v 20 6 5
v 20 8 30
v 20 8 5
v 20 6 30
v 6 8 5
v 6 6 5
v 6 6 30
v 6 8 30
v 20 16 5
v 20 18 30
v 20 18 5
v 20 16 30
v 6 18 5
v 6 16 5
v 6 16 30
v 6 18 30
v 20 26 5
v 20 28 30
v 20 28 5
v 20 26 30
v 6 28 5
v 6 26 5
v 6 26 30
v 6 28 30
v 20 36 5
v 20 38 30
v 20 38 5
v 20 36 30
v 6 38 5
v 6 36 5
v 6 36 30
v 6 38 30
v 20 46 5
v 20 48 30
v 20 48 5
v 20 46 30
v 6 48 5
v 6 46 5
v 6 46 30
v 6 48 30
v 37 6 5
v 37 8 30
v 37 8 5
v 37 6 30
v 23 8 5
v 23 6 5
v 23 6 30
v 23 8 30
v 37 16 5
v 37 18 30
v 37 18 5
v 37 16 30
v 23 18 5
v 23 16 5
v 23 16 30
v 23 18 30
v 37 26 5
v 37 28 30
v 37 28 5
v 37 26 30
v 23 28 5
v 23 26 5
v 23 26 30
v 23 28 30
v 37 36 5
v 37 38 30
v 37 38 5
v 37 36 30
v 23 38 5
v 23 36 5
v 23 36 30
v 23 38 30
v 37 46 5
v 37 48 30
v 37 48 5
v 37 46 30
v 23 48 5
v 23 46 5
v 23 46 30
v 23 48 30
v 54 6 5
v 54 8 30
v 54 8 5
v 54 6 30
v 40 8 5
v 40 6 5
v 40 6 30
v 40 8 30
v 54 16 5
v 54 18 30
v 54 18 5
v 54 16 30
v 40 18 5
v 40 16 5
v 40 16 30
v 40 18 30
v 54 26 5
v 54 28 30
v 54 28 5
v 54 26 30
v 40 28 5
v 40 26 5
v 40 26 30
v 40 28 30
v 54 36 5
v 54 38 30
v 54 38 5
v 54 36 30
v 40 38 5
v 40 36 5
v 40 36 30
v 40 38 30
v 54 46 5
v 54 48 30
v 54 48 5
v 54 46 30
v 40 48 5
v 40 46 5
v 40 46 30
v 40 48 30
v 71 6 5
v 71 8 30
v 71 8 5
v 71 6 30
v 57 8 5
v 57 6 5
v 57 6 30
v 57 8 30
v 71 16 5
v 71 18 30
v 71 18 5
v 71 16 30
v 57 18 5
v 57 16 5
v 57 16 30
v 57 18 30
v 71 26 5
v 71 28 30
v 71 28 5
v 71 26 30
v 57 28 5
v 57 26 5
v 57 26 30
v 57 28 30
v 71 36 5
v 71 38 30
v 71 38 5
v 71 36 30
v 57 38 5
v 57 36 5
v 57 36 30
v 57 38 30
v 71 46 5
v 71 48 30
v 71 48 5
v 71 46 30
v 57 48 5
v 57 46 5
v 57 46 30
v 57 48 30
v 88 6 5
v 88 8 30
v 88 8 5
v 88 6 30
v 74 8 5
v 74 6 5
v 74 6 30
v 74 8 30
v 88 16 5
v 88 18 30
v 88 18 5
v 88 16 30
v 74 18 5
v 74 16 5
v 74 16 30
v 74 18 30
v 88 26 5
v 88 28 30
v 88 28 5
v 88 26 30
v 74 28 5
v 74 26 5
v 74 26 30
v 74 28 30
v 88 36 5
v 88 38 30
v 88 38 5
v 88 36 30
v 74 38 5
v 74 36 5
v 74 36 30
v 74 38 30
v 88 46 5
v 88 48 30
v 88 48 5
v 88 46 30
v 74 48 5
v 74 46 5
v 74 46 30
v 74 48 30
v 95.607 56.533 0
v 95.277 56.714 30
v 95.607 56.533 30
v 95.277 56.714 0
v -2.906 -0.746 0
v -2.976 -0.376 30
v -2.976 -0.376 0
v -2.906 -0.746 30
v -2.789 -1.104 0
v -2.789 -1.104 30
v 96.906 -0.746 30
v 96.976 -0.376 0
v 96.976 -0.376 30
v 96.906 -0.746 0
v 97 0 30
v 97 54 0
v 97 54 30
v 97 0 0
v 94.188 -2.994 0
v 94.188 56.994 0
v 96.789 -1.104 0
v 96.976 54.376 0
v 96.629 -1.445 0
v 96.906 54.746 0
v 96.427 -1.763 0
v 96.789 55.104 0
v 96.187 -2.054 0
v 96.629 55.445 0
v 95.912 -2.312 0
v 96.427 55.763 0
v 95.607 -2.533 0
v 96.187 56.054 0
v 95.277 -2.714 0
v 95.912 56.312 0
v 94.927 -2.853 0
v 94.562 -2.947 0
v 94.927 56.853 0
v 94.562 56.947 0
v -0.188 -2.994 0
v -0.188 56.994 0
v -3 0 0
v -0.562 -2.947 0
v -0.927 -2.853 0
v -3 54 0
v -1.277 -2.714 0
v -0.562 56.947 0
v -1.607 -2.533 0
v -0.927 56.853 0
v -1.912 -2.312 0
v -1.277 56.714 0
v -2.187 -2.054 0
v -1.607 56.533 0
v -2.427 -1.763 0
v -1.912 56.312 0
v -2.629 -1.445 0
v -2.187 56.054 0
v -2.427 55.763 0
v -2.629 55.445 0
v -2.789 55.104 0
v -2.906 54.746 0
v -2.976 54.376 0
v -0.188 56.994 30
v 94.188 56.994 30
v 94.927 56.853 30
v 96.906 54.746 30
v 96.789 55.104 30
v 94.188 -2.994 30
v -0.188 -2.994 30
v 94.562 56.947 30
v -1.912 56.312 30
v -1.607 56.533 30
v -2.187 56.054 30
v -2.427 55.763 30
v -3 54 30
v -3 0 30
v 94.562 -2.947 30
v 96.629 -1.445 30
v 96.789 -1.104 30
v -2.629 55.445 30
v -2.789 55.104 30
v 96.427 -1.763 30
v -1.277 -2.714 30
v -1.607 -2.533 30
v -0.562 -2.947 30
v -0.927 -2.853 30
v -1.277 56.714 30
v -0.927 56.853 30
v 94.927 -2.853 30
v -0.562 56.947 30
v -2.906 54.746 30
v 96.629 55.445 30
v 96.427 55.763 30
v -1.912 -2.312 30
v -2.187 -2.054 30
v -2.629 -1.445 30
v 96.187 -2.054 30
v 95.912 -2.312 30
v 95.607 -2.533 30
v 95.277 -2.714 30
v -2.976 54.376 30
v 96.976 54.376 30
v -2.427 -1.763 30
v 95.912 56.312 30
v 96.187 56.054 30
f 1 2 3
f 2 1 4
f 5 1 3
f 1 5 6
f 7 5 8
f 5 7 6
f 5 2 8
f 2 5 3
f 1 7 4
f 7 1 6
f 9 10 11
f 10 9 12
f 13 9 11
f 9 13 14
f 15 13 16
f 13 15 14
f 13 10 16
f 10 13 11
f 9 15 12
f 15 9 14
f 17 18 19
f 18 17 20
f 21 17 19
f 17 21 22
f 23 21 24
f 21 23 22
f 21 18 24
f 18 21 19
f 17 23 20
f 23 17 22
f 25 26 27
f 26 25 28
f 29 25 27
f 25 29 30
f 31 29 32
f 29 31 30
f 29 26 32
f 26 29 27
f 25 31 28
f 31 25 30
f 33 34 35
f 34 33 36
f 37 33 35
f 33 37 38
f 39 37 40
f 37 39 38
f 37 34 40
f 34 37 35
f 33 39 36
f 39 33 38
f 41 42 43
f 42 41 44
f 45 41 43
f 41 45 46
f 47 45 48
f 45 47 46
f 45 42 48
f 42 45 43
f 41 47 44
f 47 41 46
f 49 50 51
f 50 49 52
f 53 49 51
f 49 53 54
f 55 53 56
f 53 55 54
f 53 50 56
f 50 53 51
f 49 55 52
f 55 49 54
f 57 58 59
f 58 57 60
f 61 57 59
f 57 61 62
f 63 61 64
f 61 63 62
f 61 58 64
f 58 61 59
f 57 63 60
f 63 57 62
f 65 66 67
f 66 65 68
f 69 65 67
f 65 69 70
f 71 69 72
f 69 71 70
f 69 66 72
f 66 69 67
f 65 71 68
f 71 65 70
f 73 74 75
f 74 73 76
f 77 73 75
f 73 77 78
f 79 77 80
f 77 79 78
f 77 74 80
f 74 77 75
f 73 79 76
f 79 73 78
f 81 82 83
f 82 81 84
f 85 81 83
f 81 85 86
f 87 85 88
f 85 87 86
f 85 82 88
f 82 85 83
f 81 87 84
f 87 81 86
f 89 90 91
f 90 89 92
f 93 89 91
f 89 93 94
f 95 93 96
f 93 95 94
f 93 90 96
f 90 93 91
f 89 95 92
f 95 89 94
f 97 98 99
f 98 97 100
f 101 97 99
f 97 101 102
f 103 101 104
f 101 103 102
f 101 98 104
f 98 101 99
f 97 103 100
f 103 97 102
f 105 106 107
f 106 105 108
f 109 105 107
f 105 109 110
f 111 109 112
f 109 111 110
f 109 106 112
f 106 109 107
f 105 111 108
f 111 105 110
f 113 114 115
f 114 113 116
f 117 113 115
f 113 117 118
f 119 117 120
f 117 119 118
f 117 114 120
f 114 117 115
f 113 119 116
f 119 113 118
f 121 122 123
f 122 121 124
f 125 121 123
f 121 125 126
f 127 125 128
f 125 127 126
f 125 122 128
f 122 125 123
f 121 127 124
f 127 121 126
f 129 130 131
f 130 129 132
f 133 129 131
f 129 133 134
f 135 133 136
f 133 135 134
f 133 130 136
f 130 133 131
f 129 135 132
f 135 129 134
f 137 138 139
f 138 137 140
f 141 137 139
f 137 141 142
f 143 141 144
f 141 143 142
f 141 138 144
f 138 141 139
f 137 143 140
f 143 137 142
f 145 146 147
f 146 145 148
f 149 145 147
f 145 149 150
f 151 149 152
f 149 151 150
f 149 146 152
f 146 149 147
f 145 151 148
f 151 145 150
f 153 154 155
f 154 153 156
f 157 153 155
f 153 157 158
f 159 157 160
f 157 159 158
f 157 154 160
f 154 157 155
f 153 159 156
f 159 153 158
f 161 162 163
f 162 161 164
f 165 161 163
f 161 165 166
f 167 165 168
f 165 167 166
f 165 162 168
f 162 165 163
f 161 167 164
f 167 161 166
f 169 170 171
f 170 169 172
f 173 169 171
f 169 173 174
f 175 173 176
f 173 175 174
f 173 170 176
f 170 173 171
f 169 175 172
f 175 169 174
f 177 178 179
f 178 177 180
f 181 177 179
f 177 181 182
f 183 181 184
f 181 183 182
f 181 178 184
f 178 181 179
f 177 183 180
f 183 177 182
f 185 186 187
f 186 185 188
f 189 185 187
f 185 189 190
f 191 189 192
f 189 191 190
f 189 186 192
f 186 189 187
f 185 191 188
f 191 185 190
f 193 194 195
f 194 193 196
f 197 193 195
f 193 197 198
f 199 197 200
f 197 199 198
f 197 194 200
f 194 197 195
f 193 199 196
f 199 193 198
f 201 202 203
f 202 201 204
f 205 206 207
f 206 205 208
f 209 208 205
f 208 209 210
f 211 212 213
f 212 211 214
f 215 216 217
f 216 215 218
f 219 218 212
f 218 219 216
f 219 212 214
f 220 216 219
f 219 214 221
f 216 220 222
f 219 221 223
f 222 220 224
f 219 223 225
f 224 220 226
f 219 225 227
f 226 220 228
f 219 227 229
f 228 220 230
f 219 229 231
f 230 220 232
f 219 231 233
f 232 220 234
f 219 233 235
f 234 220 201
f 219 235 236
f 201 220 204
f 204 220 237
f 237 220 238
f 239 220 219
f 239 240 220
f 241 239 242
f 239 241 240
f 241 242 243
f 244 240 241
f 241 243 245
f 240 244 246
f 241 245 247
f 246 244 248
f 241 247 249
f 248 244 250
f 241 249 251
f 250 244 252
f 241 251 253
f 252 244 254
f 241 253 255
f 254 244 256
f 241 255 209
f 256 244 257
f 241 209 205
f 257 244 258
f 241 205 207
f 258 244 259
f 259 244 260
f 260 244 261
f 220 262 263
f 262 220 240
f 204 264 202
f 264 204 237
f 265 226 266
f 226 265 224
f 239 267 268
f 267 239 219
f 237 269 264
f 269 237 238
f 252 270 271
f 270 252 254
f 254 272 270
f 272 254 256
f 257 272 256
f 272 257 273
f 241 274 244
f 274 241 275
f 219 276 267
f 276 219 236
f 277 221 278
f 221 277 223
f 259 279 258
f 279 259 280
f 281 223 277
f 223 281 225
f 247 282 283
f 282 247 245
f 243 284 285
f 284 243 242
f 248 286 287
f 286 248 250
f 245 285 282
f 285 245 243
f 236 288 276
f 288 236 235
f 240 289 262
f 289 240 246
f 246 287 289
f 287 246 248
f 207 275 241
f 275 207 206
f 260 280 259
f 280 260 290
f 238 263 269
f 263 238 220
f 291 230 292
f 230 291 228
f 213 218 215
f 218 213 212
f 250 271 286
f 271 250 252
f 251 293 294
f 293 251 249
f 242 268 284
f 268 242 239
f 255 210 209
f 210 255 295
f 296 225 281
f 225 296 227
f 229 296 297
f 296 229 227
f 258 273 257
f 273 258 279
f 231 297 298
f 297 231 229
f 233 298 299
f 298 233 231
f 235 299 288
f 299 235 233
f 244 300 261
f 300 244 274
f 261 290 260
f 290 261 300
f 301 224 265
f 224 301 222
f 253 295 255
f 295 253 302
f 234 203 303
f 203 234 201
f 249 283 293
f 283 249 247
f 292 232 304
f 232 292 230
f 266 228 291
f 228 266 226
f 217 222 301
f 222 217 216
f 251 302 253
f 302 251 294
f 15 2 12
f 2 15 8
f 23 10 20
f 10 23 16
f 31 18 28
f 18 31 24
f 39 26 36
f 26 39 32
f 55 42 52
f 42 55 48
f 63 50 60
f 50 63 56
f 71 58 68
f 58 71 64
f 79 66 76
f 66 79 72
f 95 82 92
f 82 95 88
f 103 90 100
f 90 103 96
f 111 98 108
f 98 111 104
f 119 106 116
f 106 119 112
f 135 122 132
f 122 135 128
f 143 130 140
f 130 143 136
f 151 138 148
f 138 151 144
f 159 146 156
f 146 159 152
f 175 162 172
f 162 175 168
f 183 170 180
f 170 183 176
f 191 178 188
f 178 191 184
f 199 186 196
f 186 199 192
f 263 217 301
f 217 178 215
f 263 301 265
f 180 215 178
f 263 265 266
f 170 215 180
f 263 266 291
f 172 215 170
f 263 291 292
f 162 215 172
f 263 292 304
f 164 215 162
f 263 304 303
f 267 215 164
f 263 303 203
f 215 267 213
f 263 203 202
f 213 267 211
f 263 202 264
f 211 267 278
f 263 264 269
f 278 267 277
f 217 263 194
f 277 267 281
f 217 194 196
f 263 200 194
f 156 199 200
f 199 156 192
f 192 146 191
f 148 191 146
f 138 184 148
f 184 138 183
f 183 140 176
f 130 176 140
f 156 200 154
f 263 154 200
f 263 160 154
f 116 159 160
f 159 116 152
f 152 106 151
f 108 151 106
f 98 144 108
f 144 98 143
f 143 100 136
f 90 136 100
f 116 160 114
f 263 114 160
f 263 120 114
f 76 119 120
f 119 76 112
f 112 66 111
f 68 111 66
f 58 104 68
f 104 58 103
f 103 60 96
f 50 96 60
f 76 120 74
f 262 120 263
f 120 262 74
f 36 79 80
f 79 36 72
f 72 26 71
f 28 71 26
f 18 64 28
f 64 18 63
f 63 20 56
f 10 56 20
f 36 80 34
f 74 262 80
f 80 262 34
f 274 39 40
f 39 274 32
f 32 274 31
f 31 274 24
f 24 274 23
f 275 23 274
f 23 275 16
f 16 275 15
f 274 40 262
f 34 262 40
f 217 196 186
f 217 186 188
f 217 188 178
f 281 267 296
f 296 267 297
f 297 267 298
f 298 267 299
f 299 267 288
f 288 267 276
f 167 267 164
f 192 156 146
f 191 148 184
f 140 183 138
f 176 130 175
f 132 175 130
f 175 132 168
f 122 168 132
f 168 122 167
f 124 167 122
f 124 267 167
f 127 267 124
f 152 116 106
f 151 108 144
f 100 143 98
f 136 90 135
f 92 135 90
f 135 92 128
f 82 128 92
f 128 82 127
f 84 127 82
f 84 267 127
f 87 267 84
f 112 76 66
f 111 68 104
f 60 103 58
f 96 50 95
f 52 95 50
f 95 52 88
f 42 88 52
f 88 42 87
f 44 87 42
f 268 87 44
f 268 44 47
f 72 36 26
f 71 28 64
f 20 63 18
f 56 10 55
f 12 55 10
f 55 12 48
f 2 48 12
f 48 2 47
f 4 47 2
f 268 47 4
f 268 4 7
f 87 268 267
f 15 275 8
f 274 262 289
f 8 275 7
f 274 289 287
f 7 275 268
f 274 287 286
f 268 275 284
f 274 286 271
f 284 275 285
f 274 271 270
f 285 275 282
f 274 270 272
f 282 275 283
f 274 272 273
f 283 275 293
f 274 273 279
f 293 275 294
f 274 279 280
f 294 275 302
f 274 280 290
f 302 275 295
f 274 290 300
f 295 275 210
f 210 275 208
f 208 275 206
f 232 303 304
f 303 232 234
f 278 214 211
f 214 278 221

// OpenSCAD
// [FL_INDEX: keywords="openscad, 3d_parametric, Collar_Stay_Box_Customizer, csg_solid" | COT="Parametric OpenSCAD design from 3DCodeverse"]
// Title: Collar Stay Box Customizer

// holder for collar stays
$fn=50*1;

//How wide should the box be (mm)?
wt = 100; //[24:250]
w=wt-6;

//How deep should the box be (mm)?
dt = 60; //[16:250]
d=dt-6;

//How many slots across width?
hw = floor((w)/17);

//Gap size on end
gw = (w-(hw-1)*17)/2;

//How many slots across depth
hd = floor((d)/10);

//Gap size on end
gd = (d-(hd-1)*10)/2;
echo (gd);

difference() {
	minkowski(){
		cube([w,d,29]);
		cylinder (r=3,h=1);
	}
	for (i = [0:hw-1]) {
		for (j = [0:hd-1]) {
			translate([gw+i*17-7,gd+j*10-1,5]) cube([14,2,29]);
		}
      }
}
